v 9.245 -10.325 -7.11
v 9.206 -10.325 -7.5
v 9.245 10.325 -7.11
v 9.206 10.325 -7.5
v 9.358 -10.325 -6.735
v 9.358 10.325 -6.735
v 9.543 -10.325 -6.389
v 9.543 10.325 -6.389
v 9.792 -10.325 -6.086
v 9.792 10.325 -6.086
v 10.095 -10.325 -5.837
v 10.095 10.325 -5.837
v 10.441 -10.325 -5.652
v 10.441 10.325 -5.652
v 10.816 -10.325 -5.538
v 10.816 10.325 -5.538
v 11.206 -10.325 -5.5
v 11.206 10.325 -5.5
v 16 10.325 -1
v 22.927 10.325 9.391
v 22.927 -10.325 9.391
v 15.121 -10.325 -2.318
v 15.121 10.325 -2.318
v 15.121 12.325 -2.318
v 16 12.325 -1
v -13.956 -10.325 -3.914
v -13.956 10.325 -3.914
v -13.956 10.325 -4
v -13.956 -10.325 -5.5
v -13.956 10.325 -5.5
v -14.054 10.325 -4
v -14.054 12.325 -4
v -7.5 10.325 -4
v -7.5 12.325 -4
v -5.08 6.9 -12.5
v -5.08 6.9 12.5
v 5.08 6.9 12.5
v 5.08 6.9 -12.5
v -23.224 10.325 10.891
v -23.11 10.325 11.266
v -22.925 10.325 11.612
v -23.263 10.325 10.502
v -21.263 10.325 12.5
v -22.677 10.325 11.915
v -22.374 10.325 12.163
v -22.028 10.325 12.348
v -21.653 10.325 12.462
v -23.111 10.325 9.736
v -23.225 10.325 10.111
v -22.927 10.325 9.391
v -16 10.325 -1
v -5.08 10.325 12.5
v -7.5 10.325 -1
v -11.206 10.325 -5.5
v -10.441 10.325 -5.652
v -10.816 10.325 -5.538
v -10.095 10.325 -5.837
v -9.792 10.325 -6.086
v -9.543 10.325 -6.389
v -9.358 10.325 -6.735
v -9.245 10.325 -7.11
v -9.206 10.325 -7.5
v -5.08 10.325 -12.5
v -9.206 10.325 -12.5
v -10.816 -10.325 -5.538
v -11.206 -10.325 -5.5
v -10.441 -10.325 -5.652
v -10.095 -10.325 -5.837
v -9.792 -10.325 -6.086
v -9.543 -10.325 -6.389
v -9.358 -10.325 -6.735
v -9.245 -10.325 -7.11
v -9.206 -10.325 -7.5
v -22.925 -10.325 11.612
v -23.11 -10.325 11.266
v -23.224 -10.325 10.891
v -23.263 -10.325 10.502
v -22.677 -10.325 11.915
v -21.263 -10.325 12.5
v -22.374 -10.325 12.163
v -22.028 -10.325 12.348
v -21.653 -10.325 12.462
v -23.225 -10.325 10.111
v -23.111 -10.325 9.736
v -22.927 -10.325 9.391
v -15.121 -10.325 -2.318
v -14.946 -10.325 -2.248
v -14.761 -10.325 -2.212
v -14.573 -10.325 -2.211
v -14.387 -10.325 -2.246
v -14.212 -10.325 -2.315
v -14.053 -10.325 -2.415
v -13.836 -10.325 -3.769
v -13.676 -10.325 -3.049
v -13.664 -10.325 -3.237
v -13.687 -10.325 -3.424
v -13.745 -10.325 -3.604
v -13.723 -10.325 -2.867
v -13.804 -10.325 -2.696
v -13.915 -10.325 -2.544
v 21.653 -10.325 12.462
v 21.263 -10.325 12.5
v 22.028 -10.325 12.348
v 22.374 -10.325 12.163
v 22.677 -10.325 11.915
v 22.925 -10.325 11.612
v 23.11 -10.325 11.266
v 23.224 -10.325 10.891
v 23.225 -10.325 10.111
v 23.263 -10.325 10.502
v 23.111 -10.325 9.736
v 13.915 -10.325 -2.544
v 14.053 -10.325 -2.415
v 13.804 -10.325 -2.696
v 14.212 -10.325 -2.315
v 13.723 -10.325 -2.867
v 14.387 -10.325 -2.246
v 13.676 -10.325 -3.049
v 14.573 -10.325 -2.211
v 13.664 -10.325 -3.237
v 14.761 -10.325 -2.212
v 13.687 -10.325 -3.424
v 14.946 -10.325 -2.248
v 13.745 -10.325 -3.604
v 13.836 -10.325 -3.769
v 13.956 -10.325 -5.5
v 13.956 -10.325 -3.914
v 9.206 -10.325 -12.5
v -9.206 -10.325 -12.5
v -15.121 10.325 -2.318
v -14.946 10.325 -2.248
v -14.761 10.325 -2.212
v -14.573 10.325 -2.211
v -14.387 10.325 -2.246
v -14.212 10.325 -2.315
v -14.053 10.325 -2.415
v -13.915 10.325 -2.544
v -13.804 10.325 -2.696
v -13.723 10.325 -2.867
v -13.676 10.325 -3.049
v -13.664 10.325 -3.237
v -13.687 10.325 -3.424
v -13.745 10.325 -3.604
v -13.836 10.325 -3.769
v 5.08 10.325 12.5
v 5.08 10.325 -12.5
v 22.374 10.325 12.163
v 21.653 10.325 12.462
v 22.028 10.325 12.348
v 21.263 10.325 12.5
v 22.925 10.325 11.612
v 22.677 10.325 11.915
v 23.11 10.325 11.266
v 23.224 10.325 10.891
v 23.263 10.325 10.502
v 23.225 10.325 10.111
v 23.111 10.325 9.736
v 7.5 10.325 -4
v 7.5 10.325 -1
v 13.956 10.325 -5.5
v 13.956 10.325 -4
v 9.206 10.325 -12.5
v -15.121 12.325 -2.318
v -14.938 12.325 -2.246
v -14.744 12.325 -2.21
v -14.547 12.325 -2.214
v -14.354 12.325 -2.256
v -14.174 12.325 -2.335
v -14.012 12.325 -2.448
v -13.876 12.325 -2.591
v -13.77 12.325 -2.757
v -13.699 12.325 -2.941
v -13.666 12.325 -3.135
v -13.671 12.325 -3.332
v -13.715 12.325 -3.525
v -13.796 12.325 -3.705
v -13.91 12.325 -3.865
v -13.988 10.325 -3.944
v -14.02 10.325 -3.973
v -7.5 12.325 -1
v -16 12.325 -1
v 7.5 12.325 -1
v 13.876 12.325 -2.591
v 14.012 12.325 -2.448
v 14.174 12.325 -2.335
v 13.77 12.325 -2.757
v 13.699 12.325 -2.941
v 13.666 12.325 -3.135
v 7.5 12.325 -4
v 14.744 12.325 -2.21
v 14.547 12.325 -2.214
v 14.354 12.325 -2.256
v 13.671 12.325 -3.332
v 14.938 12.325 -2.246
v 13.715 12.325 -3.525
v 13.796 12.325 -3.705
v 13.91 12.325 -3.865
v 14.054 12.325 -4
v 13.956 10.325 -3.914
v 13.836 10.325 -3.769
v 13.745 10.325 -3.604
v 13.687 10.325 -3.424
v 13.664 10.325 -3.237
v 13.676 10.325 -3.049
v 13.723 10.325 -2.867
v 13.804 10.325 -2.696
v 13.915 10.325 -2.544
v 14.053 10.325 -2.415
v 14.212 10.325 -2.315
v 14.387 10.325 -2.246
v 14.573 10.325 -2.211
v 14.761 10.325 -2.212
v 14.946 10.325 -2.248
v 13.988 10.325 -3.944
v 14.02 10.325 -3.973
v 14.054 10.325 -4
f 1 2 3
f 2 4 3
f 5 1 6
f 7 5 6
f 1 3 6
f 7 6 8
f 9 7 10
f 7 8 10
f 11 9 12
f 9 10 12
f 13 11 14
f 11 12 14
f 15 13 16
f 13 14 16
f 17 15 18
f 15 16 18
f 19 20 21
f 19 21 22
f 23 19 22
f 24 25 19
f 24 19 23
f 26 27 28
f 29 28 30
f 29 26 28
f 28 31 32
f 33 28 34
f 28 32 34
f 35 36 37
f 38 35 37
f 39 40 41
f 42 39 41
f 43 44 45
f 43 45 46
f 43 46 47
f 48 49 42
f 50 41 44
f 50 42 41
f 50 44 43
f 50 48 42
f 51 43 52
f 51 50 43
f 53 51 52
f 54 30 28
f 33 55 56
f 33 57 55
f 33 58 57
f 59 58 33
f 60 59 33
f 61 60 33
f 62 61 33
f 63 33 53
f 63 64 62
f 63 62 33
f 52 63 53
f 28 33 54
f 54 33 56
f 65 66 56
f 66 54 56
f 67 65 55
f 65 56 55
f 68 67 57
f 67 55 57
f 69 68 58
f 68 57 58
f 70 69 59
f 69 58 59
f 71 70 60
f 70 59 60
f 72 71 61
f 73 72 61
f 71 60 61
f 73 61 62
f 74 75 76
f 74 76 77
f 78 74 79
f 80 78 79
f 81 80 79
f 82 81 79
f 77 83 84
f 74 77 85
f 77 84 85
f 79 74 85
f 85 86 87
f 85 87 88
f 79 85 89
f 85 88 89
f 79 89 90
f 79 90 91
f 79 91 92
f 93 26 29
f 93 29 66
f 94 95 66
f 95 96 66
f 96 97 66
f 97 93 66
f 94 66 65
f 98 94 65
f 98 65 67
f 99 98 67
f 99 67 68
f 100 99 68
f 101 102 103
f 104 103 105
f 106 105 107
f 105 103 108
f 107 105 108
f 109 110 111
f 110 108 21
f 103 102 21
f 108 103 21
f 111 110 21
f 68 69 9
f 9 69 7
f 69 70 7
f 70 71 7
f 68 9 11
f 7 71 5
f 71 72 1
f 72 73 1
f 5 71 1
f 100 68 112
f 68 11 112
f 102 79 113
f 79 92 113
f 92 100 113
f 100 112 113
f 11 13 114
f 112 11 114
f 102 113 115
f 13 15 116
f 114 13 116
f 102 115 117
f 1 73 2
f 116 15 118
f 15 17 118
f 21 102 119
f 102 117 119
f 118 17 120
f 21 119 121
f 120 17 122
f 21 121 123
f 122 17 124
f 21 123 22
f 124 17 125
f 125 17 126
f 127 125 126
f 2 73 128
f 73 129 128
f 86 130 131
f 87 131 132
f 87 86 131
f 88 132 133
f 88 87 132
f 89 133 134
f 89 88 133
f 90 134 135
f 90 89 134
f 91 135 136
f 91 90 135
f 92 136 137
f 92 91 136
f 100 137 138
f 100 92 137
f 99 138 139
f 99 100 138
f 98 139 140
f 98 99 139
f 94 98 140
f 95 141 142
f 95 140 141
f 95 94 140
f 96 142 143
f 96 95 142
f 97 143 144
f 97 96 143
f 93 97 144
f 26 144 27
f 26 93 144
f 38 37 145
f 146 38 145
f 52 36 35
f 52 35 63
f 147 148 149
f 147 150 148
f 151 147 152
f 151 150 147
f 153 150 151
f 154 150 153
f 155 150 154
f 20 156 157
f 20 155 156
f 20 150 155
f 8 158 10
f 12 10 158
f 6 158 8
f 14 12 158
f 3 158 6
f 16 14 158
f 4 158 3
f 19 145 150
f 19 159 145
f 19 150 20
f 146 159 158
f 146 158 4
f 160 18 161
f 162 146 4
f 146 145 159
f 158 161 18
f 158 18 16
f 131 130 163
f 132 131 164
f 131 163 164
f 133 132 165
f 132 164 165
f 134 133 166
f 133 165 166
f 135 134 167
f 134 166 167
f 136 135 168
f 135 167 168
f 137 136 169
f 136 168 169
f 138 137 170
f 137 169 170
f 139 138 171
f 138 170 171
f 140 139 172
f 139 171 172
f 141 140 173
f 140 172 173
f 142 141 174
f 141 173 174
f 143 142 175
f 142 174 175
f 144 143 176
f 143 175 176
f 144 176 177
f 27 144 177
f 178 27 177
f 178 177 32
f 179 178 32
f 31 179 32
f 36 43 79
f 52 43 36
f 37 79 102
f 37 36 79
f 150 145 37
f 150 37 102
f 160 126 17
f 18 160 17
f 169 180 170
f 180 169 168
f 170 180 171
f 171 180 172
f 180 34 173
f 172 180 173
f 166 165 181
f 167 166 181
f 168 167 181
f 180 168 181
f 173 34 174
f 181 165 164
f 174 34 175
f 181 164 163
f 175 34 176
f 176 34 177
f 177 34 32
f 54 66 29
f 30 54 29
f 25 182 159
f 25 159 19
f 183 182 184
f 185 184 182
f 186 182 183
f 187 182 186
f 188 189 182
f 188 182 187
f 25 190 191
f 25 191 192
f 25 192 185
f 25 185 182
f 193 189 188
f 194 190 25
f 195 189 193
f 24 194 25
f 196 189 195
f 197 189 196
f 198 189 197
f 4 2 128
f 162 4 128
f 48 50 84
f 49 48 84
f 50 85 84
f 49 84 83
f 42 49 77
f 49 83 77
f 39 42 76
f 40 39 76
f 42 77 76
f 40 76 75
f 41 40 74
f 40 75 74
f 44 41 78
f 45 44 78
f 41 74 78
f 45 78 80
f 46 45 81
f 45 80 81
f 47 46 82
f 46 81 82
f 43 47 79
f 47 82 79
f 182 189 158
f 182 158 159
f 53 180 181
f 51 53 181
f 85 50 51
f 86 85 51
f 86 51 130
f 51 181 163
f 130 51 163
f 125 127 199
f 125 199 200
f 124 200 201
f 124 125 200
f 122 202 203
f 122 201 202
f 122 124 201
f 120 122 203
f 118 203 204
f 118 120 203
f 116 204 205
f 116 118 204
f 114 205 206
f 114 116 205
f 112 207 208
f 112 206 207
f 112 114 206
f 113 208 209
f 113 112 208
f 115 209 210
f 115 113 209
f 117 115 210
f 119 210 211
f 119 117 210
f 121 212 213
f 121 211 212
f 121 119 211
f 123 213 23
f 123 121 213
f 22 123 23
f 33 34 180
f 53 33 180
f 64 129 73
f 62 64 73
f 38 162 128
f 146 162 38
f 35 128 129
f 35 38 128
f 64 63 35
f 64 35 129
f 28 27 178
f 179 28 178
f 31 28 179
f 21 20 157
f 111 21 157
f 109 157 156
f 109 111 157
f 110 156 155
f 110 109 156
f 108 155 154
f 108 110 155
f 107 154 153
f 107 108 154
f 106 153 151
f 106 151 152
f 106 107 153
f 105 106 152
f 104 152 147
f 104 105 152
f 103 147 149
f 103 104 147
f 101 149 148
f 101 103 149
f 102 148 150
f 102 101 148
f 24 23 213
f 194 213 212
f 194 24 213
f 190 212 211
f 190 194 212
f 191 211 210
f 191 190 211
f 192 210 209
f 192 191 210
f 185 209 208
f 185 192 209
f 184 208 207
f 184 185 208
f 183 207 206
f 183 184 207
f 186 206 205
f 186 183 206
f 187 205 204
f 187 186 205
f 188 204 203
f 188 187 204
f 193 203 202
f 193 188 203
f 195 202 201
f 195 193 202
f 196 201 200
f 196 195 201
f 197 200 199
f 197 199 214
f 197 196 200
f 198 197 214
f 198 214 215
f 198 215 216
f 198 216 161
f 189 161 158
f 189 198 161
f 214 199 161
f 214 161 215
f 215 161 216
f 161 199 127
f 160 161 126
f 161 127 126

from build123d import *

# Parameters (mm, degrees)
BOSS_EXTRUDE1_DEPTH     = 10.325
CUT_EXTRUDE4_DEPTH      = 35.751582698
CUT_EXTRUDE4_DEPTH_BACK = 35.751582698
SKETCH4_W               = 0.25
SKETCH4_H               = 3
CUT_EXTRUDE5_DEPTH      = 35.751582698
CUT_EXTRUDE5_DEPTH_BACK = 35.751582698
SKETCH5_R               = 1
FILLET5_R               = 2
BOSS_EXTRUDE2_START     = 2
BOSS_EXTRUDE2_DEPTH     = 2
SKETCH7_W               = 10.16
SKETCH7_H               = 3.425
CUT_EXTRUDE6_DEPTH      = 37.305250358


with BuildPart() as part:
    # Sketch1 → Boss-Extrude1 (new, symmetric)
    with BuildSketch(Plane(origin=(0, 0, 0), x_dir=(1, 0, 0), z_dir=(0, 1, 0))):
        Polygon((-15, -12.5), (15, -12.5), (25, -12.5), (15, 2.5), (14.20625, 2.5), (14.20625, 5.5), (9.20625, 5.5), (9.20625, 12.5), (-9.20625, 12.5), (-9.20625, 5.5), (-14.20625, 5.5), (-14.20625, 2.5), (-15, 2.5), (-25, -12.5), align=None)
    extrude(amount=BOSS_EXTRUDE1_DEPTH, both=True)

    # Sketch4 → Cut-Extrude4 (cut, two sides: drawn at the far end of the back side and taken through both)
    with BuildSketch(Plane(origin=(0, 10.325, 0), x_dir=(1, 0, 0), z_dir=(0, 1, 0)).offset(-CUT_EXTRUDE4_DEPTH_BACK)):
        with Locations((14.08125, 4)):
            Rectangle(SKETCH4_W, SKETCH4_H)
        with Locations((-14.08125, 4)):
            Rectangle(SKETCH4_W, SKETCH4_H)
    extrude(amount=CUT_EXTRUDE4_DEPTH + CUT_EXTRUDE4_DEPTH_BACK, mode=Mode.SUBTRACT)

    # Sketch5 → Cut-Extrude5 (cut, two sides: drawn at the far end of the back side and taken through both)
    with BuildSketch(Plane(origin=(0, 10.325, 0), x_dir=(1, 0, 0), z_dir=(0, 1, 0)).offset(-CUT_EXTRUDE5_DEPTH_BACK)):
        with Locations((-14.663356781, 3.207106781)):
            Circle(SKETCH5_R)
        with Locations((14.663356781, 3.207106781)):
            Circle(SKETCH5_R)
    extrude(amount=CUT_EXTRUDE5_DEPTH + CUT_EXTRUDE5_DEPTH_BACK, mode=Mode.SUBTRACT)

    # Fillet5
    fillet5_edges = [part.edges().sort_by_distance(p)[0] for p in [
        (-25, 0, 12.5),
        (-9.20625, 0, -5.5),
        (9.20625, 0, -5.5),
        (25, 0, 12.5),
    ]]
    fillet(fillet5_edges, radius=FILLET5_R)

    # Sketch6 → Boss-Extrude2 (add)
    with BuildSketch(Plane(origin=(0, 10.325, 0), x_dir=(1, 0, 0), z_dir=(0, 1, 0)).offset(BOSS_EXTRUDE2_START)):
        with BuildLine():
            Line((-14.053996179, 4), (-7.5, 4))
            Line((-7.5, 4), (-7.5, 1))
            Line((-7.5, 1), (-16, 1))
            Line((-16, 1), (-15.121262614, 2.318106079))
            ThreePointArc((-15.121262614, 2.318106079), (-13.819007075, 2.671314309), (-14.053996179, 4))
        make_face()
        with BuildLine():
            Line((16, 1), (15.121262614, 2.318106079))
            ThreePointArc((15.121262614, 2.318106079), (13.819007075, 2.671314309), (14.053996179, 4))
            Line((14.053996179, 4), (7.5, 4))
            Line((7.5, 4), (7.5, 1))
            Line((7.5, 1), (16, 1))
        make_face()
    extrude(amount=-BOSS_EXTRUDE2_DEPTH)

    # Sketch7 → Cut-Extrude6 (cut, through all)
    with BuildSketch(Plane.XY.offset(12.5)):
        with Locations((0, 8.6125)):
            Rectangle(SKETCH7_W, SKETCH7_H)
    extrude(amount=-CUT_EXTRUDE6_DEPTH, mode=Mode.SUBTRACT)


solid = part.part
